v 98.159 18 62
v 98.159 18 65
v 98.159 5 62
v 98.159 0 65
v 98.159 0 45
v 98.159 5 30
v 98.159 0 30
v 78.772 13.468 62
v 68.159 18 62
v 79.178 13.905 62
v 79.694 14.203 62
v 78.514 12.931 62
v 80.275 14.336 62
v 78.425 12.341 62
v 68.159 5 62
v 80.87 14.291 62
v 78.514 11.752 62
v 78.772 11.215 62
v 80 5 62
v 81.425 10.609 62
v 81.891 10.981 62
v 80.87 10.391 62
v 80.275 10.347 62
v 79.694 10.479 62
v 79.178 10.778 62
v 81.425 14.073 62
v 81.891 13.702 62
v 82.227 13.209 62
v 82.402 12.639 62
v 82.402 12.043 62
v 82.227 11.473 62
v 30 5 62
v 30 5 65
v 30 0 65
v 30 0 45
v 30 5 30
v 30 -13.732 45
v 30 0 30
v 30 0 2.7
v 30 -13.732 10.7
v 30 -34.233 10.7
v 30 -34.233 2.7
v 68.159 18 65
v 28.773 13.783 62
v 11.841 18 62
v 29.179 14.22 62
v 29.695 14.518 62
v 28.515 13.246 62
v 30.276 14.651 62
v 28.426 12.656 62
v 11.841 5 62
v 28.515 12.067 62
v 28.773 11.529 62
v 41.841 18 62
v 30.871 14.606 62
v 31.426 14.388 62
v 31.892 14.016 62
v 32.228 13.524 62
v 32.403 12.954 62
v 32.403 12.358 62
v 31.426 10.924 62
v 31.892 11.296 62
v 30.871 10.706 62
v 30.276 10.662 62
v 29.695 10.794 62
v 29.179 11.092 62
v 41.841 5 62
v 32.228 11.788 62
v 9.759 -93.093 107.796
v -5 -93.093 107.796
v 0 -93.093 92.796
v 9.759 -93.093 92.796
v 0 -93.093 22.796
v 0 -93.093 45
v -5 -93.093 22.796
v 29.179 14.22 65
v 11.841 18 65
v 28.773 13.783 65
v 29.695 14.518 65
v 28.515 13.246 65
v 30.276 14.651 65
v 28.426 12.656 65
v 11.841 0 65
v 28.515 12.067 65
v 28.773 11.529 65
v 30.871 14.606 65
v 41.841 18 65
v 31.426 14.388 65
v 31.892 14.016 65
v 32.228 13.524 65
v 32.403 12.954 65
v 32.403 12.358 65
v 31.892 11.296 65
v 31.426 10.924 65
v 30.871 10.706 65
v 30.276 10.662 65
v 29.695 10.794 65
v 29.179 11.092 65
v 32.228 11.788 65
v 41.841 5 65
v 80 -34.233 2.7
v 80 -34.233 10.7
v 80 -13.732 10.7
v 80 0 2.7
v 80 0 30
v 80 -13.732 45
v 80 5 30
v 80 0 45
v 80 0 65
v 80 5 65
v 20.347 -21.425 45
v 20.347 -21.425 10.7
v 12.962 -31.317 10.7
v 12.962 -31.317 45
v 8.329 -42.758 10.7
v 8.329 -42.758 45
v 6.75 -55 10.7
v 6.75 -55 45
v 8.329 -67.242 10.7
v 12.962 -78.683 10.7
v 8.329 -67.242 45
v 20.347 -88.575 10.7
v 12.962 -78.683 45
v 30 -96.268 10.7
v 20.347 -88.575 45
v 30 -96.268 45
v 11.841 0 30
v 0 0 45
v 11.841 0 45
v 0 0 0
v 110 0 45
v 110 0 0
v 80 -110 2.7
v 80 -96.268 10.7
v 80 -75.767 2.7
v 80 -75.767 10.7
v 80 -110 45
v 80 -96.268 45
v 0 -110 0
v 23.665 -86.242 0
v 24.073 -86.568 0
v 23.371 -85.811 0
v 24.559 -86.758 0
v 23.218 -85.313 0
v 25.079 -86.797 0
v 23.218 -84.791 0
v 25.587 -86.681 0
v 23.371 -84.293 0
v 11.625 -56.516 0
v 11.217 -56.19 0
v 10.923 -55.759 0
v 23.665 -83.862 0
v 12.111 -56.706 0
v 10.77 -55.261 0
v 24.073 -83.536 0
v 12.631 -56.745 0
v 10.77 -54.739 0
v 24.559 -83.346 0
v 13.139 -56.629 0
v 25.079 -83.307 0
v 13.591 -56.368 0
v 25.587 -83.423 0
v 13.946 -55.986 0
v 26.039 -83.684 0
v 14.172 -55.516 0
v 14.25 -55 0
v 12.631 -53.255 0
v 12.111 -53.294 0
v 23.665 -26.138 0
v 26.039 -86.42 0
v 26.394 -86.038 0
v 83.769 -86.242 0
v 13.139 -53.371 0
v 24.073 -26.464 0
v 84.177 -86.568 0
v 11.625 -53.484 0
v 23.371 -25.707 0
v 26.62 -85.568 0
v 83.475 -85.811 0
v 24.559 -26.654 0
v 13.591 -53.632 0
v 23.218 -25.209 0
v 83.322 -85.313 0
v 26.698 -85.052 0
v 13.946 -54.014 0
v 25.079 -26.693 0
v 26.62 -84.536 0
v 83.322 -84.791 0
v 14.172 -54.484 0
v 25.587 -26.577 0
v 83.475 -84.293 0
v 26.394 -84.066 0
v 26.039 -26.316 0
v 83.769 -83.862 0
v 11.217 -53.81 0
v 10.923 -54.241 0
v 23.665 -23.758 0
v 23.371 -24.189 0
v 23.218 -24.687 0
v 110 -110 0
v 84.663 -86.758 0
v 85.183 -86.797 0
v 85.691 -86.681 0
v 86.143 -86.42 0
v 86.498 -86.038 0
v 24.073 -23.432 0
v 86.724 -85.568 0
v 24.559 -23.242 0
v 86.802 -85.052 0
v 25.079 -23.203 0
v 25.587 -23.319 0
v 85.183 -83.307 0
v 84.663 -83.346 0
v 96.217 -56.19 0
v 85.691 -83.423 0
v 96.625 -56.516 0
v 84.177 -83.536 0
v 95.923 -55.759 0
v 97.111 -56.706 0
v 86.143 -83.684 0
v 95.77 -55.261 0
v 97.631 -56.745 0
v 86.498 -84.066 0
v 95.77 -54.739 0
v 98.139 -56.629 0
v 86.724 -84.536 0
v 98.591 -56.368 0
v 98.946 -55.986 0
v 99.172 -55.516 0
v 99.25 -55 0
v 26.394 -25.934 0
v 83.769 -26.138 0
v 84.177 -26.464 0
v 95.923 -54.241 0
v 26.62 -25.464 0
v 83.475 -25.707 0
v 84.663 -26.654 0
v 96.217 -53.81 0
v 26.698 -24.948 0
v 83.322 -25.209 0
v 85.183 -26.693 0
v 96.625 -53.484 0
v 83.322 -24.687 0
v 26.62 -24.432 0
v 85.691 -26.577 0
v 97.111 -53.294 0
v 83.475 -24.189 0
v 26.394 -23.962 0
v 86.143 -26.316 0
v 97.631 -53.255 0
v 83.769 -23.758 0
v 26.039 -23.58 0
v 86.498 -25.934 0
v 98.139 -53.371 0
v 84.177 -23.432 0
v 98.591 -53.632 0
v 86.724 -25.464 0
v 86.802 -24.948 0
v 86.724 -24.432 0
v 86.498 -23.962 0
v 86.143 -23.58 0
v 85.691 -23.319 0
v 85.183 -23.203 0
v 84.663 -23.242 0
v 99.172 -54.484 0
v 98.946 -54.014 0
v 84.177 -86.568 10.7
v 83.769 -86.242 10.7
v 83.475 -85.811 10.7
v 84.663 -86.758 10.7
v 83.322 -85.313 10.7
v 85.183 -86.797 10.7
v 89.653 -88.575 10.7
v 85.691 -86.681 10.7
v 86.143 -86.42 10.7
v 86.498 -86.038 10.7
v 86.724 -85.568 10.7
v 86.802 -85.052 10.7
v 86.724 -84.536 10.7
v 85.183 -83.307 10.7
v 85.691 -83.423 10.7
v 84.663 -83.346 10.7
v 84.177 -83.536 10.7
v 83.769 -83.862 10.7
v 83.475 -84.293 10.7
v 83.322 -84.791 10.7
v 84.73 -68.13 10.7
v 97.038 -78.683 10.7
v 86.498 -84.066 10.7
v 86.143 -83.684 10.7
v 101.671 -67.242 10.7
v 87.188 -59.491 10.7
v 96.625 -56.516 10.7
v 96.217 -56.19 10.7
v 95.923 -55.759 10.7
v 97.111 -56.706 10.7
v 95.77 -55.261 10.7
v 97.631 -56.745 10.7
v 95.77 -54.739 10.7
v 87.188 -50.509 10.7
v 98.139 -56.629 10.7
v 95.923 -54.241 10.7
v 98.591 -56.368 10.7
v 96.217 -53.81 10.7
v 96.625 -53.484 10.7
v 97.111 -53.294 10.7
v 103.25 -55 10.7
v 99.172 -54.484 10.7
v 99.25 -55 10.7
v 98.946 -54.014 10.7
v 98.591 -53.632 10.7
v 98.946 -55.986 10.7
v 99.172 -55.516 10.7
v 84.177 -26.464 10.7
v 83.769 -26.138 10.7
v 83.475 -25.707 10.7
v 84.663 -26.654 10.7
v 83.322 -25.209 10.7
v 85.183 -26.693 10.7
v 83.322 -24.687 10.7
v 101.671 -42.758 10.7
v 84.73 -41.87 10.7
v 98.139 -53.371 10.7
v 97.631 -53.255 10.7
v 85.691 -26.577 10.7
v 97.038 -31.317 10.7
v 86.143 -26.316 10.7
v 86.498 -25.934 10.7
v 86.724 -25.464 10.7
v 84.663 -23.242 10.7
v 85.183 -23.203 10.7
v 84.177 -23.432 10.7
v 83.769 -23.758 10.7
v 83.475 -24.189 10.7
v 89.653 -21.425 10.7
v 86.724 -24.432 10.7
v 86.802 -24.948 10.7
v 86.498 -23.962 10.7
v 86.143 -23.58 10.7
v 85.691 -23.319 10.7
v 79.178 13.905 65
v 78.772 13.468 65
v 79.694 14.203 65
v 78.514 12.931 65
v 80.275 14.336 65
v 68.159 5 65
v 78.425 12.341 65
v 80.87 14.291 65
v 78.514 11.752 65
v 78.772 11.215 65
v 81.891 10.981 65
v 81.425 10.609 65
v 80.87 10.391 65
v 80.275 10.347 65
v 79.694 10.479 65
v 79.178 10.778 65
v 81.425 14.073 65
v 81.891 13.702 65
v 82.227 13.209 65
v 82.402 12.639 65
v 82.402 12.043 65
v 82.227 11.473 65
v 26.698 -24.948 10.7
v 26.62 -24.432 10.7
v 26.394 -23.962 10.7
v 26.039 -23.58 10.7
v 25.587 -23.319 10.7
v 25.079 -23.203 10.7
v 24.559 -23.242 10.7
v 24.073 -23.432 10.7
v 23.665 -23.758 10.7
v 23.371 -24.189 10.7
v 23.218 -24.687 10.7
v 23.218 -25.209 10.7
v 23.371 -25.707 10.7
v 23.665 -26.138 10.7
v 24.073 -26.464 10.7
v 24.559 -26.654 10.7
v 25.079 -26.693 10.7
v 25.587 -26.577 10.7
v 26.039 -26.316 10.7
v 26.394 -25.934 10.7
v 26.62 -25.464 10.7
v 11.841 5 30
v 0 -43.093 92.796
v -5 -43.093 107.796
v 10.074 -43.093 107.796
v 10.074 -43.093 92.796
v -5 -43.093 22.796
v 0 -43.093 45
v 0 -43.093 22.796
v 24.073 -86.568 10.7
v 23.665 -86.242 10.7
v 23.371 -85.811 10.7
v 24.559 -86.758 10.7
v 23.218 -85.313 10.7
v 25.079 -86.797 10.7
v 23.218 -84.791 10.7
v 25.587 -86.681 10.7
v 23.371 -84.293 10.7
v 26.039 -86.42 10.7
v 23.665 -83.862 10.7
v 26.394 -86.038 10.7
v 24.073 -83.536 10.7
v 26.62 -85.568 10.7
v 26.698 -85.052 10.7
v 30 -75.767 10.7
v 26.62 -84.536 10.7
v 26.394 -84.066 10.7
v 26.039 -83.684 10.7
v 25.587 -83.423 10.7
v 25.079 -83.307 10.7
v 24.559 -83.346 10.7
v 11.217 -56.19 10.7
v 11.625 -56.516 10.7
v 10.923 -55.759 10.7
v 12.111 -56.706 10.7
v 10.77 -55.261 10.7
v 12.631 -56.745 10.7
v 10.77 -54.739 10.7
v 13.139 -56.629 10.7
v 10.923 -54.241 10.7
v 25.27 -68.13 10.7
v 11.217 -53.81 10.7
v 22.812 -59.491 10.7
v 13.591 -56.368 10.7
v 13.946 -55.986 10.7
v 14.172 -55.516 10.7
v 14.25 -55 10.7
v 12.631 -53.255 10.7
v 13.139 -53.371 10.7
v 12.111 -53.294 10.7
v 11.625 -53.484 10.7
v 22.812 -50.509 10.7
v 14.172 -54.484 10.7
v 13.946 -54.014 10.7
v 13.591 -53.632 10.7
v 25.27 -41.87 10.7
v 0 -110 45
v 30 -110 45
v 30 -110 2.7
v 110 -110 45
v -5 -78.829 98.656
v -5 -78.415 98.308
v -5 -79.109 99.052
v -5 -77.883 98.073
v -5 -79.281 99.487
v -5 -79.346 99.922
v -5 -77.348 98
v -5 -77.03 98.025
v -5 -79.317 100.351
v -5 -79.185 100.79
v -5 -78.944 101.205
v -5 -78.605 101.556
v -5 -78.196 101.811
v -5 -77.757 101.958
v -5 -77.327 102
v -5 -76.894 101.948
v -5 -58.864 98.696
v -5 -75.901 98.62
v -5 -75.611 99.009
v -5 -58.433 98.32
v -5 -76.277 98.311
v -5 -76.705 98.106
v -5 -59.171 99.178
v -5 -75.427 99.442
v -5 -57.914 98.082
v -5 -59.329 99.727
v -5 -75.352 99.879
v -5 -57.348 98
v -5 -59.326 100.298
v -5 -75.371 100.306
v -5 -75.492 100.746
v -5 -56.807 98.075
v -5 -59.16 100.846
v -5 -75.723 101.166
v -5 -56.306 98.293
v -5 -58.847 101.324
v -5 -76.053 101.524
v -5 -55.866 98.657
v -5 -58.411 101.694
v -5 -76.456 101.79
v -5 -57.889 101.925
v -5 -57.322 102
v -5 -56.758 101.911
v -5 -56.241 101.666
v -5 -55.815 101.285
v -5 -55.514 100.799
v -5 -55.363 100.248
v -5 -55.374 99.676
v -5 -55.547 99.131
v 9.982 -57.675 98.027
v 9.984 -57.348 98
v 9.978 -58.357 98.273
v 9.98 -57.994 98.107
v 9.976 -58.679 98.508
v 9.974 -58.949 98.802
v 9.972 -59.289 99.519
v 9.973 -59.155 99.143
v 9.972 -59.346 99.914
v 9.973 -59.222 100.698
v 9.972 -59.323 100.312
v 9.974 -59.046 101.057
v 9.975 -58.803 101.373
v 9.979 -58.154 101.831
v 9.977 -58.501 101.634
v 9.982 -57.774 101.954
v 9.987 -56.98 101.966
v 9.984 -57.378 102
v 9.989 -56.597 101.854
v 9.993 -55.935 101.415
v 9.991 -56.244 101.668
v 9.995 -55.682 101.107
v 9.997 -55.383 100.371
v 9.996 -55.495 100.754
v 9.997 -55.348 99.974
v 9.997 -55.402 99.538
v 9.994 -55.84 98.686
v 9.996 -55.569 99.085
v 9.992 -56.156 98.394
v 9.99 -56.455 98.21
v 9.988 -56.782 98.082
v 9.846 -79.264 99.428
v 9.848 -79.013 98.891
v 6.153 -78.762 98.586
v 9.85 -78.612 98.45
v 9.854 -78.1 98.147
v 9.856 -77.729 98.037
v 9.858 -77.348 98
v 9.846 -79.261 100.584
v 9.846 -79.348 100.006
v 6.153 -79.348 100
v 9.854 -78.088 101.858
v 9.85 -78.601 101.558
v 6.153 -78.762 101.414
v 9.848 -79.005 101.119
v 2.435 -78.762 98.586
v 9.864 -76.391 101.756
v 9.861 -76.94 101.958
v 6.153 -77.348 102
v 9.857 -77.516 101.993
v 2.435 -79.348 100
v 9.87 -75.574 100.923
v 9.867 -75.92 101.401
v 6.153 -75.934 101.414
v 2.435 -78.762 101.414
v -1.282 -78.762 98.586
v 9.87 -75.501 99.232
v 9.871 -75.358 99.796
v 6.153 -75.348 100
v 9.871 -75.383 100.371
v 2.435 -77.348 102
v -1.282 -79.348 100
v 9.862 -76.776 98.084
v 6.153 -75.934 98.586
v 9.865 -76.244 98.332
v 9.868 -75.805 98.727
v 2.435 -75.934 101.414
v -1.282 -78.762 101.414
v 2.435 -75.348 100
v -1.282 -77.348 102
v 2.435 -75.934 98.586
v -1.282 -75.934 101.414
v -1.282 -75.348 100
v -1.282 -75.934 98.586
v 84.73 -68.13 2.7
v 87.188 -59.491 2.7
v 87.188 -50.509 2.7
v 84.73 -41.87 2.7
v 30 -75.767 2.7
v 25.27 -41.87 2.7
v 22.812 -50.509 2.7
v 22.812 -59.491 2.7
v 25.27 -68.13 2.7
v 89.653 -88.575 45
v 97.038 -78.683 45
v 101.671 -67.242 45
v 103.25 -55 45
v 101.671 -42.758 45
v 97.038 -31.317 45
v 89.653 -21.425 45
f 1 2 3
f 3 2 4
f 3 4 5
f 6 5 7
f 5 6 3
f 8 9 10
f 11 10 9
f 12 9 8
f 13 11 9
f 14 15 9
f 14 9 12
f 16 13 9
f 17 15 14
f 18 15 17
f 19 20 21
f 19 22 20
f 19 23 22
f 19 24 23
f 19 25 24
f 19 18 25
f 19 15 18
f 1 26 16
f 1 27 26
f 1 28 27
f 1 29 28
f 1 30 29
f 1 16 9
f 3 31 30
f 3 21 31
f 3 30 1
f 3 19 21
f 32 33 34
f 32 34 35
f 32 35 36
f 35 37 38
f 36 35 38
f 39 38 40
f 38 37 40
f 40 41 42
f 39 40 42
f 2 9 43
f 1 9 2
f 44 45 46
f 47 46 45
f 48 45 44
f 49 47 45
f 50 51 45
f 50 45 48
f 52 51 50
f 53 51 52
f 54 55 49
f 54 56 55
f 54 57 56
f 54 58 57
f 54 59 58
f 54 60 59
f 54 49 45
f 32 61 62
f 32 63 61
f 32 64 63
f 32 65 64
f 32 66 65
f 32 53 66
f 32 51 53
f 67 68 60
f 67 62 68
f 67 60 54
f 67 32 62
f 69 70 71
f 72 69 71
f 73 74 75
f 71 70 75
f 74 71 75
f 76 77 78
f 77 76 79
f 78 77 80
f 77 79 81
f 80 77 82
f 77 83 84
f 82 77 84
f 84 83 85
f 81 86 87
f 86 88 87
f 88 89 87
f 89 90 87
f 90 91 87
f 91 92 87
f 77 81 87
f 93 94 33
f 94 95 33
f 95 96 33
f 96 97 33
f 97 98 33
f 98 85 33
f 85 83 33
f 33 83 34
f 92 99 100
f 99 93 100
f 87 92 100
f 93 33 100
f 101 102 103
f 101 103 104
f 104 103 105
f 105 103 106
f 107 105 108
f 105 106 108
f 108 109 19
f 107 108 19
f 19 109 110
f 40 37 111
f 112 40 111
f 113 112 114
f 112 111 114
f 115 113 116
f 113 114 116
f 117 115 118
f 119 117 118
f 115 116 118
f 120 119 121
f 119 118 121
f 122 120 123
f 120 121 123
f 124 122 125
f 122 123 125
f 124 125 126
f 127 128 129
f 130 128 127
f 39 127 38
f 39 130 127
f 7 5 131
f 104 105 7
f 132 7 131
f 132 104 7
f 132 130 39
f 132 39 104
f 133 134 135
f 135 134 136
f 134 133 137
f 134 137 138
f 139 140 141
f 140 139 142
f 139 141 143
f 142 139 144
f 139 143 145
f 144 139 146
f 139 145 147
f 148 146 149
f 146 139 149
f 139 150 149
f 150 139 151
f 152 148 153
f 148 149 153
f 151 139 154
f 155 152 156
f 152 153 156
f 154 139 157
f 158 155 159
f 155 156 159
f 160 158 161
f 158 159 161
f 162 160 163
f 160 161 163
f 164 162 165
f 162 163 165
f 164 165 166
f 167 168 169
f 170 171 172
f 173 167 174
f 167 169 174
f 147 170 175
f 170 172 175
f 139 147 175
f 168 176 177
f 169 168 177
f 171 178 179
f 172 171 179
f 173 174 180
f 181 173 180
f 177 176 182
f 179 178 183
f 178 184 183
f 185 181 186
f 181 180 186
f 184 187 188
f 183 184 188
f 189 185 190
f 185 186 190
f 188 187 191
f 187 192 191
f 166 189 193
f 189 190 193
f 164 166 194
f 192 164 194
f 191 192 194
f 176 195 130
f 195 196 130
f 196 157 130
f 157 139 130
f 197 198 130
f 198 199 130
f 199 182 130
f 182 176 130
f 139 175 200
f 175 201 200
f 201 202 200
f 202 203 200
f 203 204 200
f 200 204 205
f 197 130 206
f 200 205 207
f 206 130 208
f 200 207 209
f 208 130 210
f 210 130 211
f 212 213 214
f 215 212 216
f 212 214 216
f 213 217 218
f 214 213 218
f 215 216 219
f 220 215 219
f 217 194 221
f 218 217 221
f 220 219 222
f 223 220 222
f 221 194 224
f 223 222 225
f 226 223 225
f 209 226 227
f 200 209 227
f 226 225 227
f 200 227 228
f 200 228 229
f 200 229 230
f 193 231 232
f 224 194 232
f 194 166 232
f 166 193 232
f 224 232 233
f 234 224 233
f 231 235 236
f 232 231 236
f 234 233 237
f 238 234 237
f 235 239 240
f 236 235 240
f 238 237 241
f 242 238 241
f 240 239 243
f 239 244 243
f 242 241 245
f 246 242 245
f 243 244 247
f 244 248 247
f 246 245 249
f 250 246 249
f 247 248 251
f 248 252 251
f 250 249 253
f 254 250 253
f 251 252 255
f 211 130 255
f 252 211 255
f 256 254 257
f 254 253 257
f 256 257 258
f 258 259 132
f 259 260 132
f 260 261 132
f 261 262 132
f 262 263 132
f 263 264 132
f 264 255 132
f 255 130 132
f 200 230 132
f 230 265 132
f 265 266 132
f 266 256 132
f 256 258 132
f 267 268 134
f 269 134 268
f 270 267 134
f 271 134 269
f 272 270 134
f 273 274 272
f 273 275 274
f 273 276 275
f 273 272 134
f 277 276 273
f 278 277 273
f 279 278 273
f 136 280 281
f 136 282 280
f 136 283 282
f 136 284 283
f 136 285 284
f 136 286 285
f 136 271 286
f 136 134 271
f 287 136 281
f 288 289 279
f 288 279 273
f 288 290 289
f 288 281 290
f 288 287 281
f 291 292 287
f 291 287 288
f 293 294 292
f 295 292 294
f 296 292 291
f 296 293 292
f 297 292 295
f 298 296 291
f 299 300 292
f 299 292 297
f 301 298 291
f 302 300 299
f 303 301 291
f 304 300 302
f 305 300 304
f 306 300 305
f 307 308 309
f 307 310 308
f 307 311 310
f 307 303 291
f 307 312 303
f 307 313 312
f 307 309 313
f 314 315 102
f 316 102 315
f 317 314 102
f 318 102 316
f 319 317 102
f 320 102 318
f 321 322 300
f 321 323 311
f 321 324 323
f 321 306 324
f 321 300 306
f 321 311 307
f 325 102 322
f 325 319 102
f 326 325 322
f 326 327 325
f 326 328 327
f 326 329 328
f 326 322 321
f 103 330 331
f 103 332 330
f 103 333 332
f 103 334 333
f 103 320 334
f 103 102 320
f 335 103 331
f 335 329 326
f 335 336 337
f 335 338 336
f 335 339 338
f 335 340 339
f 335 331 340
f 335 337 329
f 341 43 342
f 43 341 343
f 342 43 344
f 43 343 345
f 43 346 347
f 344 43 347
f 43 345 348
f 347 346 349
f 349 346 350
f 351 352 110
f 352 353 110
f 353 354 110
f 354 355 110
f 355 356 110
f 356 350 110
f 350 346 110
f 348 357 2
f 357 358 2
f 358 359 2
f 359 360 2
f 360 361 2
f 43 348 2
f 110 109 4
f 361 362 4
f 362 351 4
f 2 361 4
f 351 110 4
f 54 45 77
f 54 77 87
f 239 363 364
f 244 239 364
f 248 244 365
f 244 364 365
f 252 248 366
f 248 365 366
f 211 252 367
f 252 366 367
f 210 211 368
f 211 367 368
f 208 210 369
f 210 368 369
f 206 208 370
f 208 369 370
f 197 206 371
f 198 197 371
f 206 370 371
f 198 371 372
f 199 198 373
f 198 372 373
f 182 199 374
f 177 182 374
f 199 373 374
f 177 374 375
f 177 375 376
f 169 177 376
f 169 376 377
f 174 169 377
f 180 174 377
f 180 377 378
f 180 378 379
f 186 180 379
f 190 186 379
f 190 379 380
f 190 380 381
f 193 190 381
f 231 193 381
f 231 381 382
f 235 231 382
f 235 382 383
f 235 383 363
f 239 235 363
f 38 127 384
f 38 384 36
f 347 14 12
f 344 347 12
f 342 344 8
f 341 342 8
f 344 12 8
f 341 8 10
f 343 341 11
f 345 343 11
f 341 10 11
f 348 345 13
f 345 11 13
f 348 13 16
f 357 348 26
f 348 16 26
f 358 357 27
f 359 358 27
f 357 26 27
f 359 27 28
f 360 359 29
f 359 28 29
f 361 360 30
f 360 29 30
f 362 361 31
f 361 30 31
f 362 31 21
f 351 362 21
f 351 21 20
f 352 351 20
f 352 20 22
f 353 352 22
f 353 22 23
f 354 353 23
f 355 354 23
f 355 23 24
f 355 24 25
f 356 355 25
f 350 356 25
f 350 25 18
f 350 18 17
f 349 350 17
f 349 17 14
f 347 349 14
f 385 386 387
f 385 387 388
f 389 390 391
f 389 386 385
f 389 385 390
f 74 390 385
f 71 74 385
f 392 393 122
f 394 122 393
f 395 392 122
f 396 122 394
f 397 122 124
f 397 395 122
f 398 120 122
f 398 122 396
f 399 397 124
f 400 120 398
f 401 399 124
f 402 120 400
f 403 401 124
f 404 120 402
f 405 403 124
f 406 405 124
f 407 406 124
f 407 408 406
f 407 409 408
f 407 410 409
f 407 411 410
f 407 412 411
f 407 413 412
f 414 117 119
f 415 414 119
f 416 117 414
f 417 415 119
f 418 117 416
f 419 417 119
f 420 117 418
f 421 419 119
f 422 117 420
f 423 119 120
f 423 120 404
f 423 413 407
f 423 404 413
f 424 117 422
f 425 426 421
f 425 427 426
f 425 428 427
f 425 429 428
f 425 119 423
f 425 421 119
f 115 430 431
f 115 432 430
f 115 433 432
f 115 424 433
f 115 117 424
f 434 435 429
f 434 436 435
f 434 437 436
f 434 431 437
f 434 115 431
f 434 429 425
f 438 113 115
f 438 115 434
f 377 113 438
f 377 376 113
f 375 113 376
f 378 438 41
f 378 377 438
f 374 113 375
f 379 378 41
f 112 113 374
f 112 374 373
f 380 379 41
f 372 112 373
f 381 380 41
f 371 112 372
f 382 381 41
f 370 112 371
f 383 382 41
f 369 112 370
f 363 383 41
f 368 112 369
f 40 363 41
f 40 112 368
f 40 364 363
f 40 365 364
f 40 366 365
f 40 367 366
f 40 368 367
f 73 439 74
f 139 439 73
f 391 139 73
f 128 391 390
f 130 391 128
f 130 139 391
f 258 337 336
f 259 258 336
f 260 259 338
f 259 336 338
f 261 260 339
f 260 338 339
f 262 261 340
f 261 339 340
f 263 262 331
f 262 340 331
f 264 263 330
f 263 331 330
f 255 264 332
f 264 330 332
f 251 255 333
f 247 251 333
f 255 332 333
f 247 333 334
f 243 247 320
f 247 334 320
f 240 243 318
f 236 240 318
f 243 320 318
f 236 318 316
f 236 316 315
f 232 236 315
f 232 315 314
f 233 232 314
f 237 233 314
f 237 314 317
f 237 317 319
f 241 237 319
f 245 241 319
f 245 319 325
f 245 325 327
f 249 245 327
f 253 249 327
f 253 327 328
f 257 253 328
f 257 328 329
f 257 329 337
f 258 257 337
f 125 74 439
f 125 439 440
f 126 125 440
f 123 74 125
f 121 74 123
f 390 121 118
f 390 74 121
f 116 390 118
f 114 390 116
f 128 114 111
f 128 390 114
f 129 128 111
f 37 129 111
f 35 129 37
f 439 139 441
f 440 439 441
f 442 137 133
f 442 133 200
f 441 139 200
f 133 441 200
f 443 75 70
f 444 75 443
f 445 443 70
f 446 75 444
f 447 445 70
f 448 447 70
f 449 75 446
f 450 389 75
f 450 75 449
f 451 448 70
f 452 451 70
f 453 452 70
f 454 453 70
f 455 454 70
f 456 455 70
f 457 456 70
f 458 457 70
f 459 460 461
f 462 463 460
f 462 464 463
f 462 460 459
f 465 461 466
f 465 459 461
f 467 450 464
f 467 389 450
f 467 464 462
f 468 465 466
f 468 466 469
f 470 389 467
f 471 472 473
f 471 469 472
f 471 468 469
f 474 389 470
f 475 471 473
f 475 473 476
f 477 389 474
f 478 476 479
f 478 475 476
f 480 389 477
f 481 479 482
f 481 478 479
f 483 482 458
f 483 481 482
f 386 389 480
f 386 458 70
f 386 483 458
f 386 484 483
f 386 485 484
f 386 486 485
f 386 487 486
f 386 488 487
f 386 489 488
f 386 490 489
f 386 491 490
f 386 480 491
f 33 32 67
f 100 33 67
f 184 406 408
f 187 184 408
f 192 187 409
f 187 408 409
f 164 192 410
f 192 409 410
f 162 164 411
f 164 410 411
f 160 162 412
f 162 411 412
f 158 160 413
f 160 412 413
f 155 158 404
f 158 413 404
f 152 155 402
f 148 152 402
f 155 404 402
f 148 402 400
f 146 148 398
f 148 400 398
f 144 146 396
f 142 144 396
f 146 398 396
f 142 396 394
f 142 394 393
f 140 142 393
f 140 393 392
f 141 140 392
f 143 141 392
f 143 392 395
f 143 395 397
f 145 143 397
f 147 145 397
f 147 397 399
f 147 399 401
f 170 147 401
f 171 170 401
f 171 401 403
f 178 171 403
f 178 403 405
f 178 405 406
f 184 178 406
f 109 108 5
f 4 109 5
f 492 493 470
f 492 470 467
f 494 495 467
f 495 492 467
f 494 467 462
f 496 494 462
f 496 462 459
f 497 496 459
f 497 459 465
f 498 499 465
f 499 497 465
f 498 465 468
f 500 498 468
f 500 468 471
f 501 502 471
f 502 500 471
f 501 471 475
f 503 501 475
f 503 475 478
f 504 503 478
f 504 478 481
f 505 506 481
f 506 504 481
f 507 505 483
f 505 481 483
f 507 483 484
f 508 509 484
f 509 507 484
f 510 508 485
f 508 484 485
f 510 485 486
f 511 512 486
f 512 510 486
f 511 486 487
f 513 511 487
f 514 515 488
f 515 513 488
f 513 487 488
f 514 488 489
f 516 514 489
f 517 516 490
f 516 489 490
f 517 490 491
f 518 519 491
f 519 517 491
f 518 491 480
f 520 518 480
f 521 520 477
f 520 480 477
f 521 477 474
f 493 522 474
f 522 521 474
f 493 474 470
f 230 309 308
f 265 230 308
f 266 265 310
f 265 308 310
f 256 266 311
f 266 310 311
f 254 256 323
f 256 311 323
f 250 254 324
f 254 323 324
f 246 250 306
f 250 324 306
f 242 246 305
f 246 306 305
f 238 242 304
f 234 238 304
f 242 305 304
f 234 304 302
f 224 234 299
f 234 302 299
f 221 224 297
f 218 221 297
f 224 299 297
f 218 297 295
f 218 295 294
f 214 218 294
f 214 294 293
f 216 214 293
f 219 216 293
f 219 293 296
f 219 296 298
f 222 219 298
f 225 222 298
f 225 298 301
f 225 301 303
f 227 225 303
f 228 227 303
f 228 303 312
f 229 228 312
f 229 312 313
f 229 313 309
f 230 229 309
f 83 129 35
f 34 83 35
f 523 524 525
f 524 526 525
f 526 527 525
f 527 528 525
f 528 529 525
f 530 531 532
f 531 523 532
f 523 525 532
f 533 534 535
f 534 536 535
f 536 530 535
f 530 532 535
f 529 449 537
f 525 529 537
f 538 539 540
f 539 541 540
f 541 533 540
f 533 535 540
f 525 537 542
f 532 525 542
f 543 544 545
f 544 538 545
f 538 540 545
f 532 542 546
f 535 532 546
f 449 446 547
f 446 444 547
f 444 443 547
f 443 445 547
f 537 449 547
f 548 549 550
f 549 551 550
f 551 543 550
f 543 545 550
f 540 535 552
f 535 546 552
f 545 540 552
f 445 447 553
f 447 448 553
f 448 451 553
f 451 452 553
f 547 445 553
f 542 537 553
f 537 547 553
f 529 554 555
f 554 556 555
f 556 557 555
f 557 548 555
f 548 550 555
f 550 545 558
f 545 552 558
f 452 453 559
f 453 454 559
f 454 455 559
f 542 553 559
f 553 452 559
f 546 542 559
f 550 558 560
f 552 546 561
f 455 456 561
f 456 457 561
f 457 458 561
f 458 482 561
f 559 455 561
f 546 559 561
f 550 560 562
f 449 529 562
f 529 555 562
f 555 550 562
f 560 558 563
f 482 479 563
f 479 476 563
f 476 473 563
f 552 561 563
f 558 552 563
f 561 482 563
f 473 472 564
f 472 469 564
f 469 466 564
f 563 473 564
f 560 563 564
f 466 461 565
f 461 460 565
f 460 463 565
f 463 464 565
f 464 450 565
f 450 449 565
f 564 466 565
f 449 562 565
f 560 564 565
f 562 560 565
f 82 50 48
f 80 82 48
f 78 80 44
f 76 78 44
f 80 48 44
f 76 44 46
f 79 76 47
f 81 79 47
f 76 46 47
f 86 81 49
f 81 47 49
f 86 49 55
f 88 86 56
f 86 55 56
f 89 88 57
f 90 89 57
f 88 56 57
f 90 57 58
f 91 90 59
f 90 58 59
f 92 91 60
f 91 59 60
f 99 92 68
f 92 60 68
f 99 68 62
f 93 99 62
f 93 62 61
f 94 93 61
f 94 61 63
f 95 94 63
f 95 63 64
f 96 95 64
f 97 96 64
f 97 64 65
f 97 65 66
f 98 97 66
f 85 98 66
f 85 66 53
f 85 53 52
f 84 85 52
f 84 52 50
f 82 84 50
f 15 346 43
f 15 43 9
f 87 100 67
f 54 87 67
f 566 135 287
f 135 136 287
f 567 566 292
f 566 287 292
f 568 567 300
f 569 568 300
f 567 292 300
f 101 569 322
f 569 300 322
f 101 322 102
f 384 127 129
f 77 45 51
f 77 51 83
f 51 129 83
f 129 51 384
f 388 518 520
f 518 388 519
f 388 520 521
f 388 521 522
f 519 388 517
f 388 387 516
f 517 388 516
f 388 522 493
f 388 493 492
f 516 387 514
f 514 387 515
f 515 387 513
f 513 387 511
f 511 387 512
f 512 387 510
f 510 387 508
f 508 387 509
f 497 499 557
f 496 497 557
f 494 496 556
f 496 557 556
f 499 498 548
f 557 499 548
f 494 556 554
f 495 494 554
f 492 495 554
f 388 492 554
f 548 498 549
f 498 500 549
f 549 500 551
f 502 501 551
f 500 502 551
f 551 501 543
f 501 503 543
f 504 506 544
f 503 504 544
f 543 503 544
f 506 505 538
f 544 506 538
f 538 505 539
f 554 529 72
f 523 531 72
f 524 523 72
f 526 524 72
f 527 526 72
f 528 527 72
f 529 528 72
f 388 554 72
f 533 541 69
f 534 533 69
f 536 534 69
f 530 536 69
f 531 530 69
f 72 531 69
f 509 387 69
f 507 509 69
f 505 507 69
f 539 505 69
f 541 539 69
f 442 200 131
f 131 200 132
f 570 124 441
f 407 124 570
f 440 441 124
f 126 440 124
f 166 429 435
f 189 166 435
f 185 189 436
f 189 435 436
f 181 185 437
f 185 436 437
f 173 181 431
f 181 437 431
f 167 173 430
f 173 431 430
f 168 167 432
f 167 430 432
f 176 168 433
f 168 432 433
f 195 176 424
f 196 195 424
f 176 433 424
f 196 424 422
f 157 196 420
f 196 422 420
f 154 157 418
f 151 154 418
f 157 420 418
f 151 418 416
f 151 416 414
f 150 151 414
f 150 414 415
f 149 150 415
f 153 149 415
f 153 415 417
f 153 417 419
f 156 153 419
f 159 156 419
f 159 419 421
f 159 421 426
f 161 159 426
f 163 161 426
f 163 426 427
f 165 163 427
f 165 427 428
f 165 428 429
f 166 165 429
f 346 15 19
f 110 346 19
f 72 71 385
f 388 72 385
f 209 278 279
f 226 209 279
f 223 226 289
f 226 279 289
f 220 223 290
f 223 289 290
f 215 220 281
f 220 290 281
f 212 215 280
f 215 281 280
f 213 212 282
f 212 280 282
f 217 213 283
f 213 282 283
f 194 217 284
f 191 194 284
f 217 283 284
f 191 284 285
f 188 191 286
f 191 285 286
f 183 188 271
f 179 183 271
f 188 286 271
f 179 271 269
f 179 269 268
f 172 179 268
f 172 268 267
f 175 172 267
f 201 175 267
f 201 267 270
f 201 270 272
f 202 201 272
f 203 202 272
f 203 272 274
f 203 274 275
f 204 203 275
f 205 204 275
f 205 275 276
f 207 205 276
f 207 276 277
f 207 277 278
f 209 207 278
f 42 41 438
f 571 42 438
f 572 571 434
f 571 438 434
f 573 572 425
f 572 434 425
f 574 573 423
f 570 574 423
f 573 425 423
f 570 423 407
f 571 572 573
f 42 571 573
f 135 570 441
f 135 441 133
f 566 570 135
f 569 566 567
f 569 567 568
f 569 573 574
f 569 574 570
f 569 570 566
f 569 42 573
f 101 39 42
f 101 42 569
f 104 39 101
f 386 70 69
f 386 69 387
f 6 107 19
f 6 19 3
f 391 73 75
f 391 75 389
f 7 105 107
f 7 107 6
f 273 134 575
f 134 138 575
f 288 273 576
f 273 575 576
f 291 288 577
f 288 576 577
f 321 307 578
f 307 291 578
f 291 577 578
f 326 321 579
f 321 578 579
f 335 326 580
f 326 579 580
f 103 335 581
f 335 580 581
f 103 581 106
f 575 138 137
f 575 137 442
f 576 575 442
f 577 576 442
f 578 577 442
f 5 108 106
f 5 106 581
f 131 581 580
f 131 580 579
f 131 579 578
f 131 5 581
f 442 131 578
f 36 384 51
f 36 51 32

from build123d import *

# Parameters (mm, degrees)
SKETCH_1_W          = 110
SKETCH_1_H          = 110
EXTRUDE_1_DEPTH     = 45
SKETCH_4_R          = 32.5
CUT_EXTRUDE_1_DEPTH = 42.3
SKETCH_5_R          = 48.25
CUT_EXTRUDE_2_DEPTH = 34.3
SKETCH_6_W          = 50
SKETCH_6_H          = 110
CUT_EXTRUDE_3_DEPTH = 8
CUT_EXTRUDE_4_DEPTH = 42.3
SKETCH_8_R          = 1.75
CUT_EXTRUDE_5_DEPTH = 160.3
SKETCH_9_W          = 18.158603558
SKETCH_9_H          = 15
SKETCH_9_H_2        = 20
EXTRUDE_2_DEPTH     = 5
SKETCH_10_W         = 30
SKETCH_10_H         = 3
EXTRUDE_3_DEPTH     = 13
SKETCH_11_R         = 2
CUT_EXTRUDE_6_DEPTH = 168.463428843
SKETCH_12_W         = 85
SKETCH_12_H         = 50
EXTRUDE_4_DEPTH     = 5
EXTRUDE_5_REACH     = 191.262
SKETCH_13_W         = 15
SKETCH_13_H         = 50
CUT_EXTRUDE_8_REACH = 194.211
SKETCH_15_RX        = 2
SKETCH_15_RY        = 1.999994073


with BuildPart() as part:
    # 草图1 → 凸台-拉伸1 (new body)
    with BuildSketch(Plane.XY):
        with Locations((55, -55)):
            Rectangle(SKETCH_1_W, SKETCH_1_H)
    extrude(amount=EXTRUDE_1_DEPTH)

    # 草图4 → 切除-拉伸1 (cut)
    with BuildSketch(Plane.XY.offset(45)):
        with Locations((55, -55)):
            Circle(SKETCH_4_R)
    extrude(amount=-CUT_EXTRUDE_1_DEPTH, mode=Mode.SUBTRACT)

    # 草图5 → 切除-拉伸2 (cut)
    with BuildSketch(Plane.XY.offset(45)):
        with Locations((55, -55)):
            Circle(SKETCH_5_R)
    extrude(amount=-CUT_EXTRUDE_2_DEPTH, mode=Mode.SUBTRACT)

    # 草图6 → 切除-拉伸3 (cut)
    with BuildSketch(Plane.XY.offset(10.7)):
        with Locations((55, -55)):
            Rectangle(SKETCH_6_W, SKETCH_6_H)
    extrude(amount=-CUT_EXTRUDE_3_DEPTH, mode=Mode.SUBTRACT)

    # 草图7 → 切除-拉伸4 (cut)
    with BuildSketch(Plane.XY.offset(45)):
        with BuildLine():
            Line((80, -34.233440343), (80, 0))
            Line((80, 0), (30, 0))
            Line((30, 0), (30, -34.233440343))
            ThreePointArc((30, -34.233440343), (22.5, -55), (30, -75.766559657))
            Line((30, -75.766559657), (30, -110))
            Line((30, -110), (80, -110))
            Line((80, -110), (80, -75.766559657))
            ThreePointArc((80, -75.766559657), (87.5, -55), (80, -34.233440343))
        make_face()
    extrude(amount=-CUT_EXTRUDE_4_DEPTH, mode=Mode.SUBTRACT)

    # 草图8 → 切除-拉伸5 (cut, through all)
    with BuildSketch(Plane.XY.offset(10.7)):
        with Locations((12.5, -55)):
            Circle(SKETCH_8_R)
        with Locations((24.9479618, -24.9479618)):
            Circle(SKETCH_8_R)
        with Locations((85.0520382, -24.9479618)):
            Circle(SKETCH_8_R)
        with Locations((97.5, -55)):
            Circle(SKETCH_8_R)
        with Locations((85.0520382, -85.0520382)):
            Circle(SKETCH_8_R)
        with Locations((24.9479618, -85.0520382)):
            Circle(SKETCH_8_R)
    extrude(amount=-CUT_EXTRUDE_5_DEPTH, mode=Mode.SUBTRACT)

    # 草图9 → 凸台-拉伸2 (add)
    with BuildSketch(Plane(origin=(0, 0, 0), x_dir=(1, 0, 0), z_dir=(0, 1, 0))):
        with Locations((20.920698221, -37.5)):
            Rectangle(SKETCH_9_W, SKETCH_9_H)
        with Locations((20.920698221, -55)):
            Rectangle(SKETCH_9_W, SKETCH_9_H_2)
        with Locations((89.079301779, -37.5)):
            Rectangle(SKETCH_9_W, SKETCH_9_H)
        with Locations((89.079301779, -55)):
            Rectangle(SKETCH_9_W, SKETCH_9_H_2)
    extrude(amount=EXTRUDE_2_DEPTH)

    # 草图10 → 凸台-拉伸3 (add)
    with BuildSketch(Plane(origin=(0, 5, 0), x_dir=(1, 0, 0), z_dir=(0, 1, 0))):
        with Locations((83.158603558, -63.5)):
            Rectangle(SKETCH_10_W, SKETCH_10_H)
        with Locations((26.841396442, -63.5)):
            Rectangle(SKETCH_10_W, SKETCH_10_H)
    extrude(amount=EXTRUDE_3_DEPTH)

    # 草图11 → 切除-拉伸6 (cut, through all)
    with BuildSketch(Plane(origin=(0, 0, 62), x_dir=(-1, 0, 0), z_dir=(0, 0, -1))):
        with Locations((-30.425668719, 12.656132332)):
            Circle(SKETCH_11_R)
        with Locations((-80.424676819, 12.34118954)):
            Circle(SKETCH_11_R)
    extrude(amount=-CUT_EXTRUDE_6_DEPTH, mode=Mode.SUBTRACT)

    # 草图12 → 凸台-拉伸4 (add)
    with BuildSketch(Plane.ZY):
        with Locations((65.296402905, -68.092997568)):
            Rectangle(SKETCH_12_W, SKETCH_12_H)
    extrude(amount=EXTRUDE_4_DEPTH)

    # 凸台-拉伸5: up to this plane
    extrude_5_end = Plane(origin=(9.859168453, -77.216105133, 215), z_dir=(-0.9999801620108199, 0.006298855833765048, 1.0454600148553557e-15))
    # 草图13 → 凸台-拉伸5 (add, up to the surface)
    with BuildSketch(Plane(origin=(0, 0, 0), x_dir=(0, 0, -1), z_dir=(1, 0, 0)), mode=Mode.PRIVATE) as extrude_5_sk1:
        with Locations((-100.296402905, -68.092997568)):
            Rectangle(SKETCH_13_W, SKETCH_13_H)
    extrude_5_tool1 = split(extrude(extrude_5_sk1.sketch, amount=EXTRUDE_5_REACH, mode=Mode.PRIVATE), bisect_by=extrude_5_end, keep=Keep.BOTH, mode=Mode.PRIVATE)
    add(extrude_5_tool1.solids().sort_by_distance((0, -68.092998, 100.296403))[0])

    # 切除-拉伸8: up to this plane
    cut_extrude_8_end = Plane(origin=(9.859168453, -77.216105133, 215), z_dir=(-0.9999801620108199, 0.006298855833765048, 1.0454600148553557e-15))
    # 草图15 → 切除-拉伸8 (cut, up to the surface)
    with BuildSketch(Plane.ZY.offset(5), mode=Mode.PRIVATE) as cut_extrude_8_sk1:
        with Locations(Location((100, -57.347927742), (0, 0, -180))):
            Ellipse(SKETCH_15_RX, SKETCH_15_RY)
    cut_extrude_8_tool1 = split(extrude(cut_extrude_8_sk1.sketch, amount=-CUT_EXTRUDE_8_REACH, mode=Mode.PRIVATE), bisect_by=cut_extrude_8_end, keep=Keep.BOTH, mode=Mode.PRIVATE)
    add(cut_extrude_8_tool1.solids().sort_by_distance((-5, -57.347928, 100))[0], mode=Mode.SUBTRACT)
    # 草图15 → 切除-拉伸8 (cut, up to the surface)
    with BuildSketch(Plane.ZY.offset(5), mode=Mode.PRIVATE) as cut_extrude_8_sk2:
        with BuildLine():
            add(Edge.make_bspline(
                [(102, -77.347868558), (102.000000089, -75.347874441), (100.000000045, -75.347874396), (98, -75.347874352), (98, -77.347868469)],
                knots=[3.141592609, 3.141592609, 3.141592609, 4.712388958, 4.712388958, 6.283185307, 6.283185307, 6.283185307], degree=2, weights=[1, 0.707106773, 1, 0.707106773, 1]))
            add(Edge.make_bspline(
                [(98, -77.347868469), (98, -79.347862497), (99.999999955, -79.347862542), (101.999999911, -79.347862586), (102, -77.347868558)],
                knots=[0, 0, 0, 1.570796304, 1.570796304, 3.141592609, 3.141592609, 3.141592609], degree=2, weights=[1, 0.707106789, 1, 0.707106789, 1]))
        make_face()
    cut_extrude_8_tool2 = split(extrude(cut_extrude_8_sk2.sketch, amount=-CUT_EXTRUDE_8_REACH, mode=Mode.PRIVATE), bisect_by=cut_extrude_8_end, keep=Keep.BOTH, mode=Mode.PRIVATE)
    add(cut_extrude_8_tool2.solids().sort_by_distance((-5, -77.347868, 100))[0], mode=Mode.SUBTRACT)


solid = part.part
